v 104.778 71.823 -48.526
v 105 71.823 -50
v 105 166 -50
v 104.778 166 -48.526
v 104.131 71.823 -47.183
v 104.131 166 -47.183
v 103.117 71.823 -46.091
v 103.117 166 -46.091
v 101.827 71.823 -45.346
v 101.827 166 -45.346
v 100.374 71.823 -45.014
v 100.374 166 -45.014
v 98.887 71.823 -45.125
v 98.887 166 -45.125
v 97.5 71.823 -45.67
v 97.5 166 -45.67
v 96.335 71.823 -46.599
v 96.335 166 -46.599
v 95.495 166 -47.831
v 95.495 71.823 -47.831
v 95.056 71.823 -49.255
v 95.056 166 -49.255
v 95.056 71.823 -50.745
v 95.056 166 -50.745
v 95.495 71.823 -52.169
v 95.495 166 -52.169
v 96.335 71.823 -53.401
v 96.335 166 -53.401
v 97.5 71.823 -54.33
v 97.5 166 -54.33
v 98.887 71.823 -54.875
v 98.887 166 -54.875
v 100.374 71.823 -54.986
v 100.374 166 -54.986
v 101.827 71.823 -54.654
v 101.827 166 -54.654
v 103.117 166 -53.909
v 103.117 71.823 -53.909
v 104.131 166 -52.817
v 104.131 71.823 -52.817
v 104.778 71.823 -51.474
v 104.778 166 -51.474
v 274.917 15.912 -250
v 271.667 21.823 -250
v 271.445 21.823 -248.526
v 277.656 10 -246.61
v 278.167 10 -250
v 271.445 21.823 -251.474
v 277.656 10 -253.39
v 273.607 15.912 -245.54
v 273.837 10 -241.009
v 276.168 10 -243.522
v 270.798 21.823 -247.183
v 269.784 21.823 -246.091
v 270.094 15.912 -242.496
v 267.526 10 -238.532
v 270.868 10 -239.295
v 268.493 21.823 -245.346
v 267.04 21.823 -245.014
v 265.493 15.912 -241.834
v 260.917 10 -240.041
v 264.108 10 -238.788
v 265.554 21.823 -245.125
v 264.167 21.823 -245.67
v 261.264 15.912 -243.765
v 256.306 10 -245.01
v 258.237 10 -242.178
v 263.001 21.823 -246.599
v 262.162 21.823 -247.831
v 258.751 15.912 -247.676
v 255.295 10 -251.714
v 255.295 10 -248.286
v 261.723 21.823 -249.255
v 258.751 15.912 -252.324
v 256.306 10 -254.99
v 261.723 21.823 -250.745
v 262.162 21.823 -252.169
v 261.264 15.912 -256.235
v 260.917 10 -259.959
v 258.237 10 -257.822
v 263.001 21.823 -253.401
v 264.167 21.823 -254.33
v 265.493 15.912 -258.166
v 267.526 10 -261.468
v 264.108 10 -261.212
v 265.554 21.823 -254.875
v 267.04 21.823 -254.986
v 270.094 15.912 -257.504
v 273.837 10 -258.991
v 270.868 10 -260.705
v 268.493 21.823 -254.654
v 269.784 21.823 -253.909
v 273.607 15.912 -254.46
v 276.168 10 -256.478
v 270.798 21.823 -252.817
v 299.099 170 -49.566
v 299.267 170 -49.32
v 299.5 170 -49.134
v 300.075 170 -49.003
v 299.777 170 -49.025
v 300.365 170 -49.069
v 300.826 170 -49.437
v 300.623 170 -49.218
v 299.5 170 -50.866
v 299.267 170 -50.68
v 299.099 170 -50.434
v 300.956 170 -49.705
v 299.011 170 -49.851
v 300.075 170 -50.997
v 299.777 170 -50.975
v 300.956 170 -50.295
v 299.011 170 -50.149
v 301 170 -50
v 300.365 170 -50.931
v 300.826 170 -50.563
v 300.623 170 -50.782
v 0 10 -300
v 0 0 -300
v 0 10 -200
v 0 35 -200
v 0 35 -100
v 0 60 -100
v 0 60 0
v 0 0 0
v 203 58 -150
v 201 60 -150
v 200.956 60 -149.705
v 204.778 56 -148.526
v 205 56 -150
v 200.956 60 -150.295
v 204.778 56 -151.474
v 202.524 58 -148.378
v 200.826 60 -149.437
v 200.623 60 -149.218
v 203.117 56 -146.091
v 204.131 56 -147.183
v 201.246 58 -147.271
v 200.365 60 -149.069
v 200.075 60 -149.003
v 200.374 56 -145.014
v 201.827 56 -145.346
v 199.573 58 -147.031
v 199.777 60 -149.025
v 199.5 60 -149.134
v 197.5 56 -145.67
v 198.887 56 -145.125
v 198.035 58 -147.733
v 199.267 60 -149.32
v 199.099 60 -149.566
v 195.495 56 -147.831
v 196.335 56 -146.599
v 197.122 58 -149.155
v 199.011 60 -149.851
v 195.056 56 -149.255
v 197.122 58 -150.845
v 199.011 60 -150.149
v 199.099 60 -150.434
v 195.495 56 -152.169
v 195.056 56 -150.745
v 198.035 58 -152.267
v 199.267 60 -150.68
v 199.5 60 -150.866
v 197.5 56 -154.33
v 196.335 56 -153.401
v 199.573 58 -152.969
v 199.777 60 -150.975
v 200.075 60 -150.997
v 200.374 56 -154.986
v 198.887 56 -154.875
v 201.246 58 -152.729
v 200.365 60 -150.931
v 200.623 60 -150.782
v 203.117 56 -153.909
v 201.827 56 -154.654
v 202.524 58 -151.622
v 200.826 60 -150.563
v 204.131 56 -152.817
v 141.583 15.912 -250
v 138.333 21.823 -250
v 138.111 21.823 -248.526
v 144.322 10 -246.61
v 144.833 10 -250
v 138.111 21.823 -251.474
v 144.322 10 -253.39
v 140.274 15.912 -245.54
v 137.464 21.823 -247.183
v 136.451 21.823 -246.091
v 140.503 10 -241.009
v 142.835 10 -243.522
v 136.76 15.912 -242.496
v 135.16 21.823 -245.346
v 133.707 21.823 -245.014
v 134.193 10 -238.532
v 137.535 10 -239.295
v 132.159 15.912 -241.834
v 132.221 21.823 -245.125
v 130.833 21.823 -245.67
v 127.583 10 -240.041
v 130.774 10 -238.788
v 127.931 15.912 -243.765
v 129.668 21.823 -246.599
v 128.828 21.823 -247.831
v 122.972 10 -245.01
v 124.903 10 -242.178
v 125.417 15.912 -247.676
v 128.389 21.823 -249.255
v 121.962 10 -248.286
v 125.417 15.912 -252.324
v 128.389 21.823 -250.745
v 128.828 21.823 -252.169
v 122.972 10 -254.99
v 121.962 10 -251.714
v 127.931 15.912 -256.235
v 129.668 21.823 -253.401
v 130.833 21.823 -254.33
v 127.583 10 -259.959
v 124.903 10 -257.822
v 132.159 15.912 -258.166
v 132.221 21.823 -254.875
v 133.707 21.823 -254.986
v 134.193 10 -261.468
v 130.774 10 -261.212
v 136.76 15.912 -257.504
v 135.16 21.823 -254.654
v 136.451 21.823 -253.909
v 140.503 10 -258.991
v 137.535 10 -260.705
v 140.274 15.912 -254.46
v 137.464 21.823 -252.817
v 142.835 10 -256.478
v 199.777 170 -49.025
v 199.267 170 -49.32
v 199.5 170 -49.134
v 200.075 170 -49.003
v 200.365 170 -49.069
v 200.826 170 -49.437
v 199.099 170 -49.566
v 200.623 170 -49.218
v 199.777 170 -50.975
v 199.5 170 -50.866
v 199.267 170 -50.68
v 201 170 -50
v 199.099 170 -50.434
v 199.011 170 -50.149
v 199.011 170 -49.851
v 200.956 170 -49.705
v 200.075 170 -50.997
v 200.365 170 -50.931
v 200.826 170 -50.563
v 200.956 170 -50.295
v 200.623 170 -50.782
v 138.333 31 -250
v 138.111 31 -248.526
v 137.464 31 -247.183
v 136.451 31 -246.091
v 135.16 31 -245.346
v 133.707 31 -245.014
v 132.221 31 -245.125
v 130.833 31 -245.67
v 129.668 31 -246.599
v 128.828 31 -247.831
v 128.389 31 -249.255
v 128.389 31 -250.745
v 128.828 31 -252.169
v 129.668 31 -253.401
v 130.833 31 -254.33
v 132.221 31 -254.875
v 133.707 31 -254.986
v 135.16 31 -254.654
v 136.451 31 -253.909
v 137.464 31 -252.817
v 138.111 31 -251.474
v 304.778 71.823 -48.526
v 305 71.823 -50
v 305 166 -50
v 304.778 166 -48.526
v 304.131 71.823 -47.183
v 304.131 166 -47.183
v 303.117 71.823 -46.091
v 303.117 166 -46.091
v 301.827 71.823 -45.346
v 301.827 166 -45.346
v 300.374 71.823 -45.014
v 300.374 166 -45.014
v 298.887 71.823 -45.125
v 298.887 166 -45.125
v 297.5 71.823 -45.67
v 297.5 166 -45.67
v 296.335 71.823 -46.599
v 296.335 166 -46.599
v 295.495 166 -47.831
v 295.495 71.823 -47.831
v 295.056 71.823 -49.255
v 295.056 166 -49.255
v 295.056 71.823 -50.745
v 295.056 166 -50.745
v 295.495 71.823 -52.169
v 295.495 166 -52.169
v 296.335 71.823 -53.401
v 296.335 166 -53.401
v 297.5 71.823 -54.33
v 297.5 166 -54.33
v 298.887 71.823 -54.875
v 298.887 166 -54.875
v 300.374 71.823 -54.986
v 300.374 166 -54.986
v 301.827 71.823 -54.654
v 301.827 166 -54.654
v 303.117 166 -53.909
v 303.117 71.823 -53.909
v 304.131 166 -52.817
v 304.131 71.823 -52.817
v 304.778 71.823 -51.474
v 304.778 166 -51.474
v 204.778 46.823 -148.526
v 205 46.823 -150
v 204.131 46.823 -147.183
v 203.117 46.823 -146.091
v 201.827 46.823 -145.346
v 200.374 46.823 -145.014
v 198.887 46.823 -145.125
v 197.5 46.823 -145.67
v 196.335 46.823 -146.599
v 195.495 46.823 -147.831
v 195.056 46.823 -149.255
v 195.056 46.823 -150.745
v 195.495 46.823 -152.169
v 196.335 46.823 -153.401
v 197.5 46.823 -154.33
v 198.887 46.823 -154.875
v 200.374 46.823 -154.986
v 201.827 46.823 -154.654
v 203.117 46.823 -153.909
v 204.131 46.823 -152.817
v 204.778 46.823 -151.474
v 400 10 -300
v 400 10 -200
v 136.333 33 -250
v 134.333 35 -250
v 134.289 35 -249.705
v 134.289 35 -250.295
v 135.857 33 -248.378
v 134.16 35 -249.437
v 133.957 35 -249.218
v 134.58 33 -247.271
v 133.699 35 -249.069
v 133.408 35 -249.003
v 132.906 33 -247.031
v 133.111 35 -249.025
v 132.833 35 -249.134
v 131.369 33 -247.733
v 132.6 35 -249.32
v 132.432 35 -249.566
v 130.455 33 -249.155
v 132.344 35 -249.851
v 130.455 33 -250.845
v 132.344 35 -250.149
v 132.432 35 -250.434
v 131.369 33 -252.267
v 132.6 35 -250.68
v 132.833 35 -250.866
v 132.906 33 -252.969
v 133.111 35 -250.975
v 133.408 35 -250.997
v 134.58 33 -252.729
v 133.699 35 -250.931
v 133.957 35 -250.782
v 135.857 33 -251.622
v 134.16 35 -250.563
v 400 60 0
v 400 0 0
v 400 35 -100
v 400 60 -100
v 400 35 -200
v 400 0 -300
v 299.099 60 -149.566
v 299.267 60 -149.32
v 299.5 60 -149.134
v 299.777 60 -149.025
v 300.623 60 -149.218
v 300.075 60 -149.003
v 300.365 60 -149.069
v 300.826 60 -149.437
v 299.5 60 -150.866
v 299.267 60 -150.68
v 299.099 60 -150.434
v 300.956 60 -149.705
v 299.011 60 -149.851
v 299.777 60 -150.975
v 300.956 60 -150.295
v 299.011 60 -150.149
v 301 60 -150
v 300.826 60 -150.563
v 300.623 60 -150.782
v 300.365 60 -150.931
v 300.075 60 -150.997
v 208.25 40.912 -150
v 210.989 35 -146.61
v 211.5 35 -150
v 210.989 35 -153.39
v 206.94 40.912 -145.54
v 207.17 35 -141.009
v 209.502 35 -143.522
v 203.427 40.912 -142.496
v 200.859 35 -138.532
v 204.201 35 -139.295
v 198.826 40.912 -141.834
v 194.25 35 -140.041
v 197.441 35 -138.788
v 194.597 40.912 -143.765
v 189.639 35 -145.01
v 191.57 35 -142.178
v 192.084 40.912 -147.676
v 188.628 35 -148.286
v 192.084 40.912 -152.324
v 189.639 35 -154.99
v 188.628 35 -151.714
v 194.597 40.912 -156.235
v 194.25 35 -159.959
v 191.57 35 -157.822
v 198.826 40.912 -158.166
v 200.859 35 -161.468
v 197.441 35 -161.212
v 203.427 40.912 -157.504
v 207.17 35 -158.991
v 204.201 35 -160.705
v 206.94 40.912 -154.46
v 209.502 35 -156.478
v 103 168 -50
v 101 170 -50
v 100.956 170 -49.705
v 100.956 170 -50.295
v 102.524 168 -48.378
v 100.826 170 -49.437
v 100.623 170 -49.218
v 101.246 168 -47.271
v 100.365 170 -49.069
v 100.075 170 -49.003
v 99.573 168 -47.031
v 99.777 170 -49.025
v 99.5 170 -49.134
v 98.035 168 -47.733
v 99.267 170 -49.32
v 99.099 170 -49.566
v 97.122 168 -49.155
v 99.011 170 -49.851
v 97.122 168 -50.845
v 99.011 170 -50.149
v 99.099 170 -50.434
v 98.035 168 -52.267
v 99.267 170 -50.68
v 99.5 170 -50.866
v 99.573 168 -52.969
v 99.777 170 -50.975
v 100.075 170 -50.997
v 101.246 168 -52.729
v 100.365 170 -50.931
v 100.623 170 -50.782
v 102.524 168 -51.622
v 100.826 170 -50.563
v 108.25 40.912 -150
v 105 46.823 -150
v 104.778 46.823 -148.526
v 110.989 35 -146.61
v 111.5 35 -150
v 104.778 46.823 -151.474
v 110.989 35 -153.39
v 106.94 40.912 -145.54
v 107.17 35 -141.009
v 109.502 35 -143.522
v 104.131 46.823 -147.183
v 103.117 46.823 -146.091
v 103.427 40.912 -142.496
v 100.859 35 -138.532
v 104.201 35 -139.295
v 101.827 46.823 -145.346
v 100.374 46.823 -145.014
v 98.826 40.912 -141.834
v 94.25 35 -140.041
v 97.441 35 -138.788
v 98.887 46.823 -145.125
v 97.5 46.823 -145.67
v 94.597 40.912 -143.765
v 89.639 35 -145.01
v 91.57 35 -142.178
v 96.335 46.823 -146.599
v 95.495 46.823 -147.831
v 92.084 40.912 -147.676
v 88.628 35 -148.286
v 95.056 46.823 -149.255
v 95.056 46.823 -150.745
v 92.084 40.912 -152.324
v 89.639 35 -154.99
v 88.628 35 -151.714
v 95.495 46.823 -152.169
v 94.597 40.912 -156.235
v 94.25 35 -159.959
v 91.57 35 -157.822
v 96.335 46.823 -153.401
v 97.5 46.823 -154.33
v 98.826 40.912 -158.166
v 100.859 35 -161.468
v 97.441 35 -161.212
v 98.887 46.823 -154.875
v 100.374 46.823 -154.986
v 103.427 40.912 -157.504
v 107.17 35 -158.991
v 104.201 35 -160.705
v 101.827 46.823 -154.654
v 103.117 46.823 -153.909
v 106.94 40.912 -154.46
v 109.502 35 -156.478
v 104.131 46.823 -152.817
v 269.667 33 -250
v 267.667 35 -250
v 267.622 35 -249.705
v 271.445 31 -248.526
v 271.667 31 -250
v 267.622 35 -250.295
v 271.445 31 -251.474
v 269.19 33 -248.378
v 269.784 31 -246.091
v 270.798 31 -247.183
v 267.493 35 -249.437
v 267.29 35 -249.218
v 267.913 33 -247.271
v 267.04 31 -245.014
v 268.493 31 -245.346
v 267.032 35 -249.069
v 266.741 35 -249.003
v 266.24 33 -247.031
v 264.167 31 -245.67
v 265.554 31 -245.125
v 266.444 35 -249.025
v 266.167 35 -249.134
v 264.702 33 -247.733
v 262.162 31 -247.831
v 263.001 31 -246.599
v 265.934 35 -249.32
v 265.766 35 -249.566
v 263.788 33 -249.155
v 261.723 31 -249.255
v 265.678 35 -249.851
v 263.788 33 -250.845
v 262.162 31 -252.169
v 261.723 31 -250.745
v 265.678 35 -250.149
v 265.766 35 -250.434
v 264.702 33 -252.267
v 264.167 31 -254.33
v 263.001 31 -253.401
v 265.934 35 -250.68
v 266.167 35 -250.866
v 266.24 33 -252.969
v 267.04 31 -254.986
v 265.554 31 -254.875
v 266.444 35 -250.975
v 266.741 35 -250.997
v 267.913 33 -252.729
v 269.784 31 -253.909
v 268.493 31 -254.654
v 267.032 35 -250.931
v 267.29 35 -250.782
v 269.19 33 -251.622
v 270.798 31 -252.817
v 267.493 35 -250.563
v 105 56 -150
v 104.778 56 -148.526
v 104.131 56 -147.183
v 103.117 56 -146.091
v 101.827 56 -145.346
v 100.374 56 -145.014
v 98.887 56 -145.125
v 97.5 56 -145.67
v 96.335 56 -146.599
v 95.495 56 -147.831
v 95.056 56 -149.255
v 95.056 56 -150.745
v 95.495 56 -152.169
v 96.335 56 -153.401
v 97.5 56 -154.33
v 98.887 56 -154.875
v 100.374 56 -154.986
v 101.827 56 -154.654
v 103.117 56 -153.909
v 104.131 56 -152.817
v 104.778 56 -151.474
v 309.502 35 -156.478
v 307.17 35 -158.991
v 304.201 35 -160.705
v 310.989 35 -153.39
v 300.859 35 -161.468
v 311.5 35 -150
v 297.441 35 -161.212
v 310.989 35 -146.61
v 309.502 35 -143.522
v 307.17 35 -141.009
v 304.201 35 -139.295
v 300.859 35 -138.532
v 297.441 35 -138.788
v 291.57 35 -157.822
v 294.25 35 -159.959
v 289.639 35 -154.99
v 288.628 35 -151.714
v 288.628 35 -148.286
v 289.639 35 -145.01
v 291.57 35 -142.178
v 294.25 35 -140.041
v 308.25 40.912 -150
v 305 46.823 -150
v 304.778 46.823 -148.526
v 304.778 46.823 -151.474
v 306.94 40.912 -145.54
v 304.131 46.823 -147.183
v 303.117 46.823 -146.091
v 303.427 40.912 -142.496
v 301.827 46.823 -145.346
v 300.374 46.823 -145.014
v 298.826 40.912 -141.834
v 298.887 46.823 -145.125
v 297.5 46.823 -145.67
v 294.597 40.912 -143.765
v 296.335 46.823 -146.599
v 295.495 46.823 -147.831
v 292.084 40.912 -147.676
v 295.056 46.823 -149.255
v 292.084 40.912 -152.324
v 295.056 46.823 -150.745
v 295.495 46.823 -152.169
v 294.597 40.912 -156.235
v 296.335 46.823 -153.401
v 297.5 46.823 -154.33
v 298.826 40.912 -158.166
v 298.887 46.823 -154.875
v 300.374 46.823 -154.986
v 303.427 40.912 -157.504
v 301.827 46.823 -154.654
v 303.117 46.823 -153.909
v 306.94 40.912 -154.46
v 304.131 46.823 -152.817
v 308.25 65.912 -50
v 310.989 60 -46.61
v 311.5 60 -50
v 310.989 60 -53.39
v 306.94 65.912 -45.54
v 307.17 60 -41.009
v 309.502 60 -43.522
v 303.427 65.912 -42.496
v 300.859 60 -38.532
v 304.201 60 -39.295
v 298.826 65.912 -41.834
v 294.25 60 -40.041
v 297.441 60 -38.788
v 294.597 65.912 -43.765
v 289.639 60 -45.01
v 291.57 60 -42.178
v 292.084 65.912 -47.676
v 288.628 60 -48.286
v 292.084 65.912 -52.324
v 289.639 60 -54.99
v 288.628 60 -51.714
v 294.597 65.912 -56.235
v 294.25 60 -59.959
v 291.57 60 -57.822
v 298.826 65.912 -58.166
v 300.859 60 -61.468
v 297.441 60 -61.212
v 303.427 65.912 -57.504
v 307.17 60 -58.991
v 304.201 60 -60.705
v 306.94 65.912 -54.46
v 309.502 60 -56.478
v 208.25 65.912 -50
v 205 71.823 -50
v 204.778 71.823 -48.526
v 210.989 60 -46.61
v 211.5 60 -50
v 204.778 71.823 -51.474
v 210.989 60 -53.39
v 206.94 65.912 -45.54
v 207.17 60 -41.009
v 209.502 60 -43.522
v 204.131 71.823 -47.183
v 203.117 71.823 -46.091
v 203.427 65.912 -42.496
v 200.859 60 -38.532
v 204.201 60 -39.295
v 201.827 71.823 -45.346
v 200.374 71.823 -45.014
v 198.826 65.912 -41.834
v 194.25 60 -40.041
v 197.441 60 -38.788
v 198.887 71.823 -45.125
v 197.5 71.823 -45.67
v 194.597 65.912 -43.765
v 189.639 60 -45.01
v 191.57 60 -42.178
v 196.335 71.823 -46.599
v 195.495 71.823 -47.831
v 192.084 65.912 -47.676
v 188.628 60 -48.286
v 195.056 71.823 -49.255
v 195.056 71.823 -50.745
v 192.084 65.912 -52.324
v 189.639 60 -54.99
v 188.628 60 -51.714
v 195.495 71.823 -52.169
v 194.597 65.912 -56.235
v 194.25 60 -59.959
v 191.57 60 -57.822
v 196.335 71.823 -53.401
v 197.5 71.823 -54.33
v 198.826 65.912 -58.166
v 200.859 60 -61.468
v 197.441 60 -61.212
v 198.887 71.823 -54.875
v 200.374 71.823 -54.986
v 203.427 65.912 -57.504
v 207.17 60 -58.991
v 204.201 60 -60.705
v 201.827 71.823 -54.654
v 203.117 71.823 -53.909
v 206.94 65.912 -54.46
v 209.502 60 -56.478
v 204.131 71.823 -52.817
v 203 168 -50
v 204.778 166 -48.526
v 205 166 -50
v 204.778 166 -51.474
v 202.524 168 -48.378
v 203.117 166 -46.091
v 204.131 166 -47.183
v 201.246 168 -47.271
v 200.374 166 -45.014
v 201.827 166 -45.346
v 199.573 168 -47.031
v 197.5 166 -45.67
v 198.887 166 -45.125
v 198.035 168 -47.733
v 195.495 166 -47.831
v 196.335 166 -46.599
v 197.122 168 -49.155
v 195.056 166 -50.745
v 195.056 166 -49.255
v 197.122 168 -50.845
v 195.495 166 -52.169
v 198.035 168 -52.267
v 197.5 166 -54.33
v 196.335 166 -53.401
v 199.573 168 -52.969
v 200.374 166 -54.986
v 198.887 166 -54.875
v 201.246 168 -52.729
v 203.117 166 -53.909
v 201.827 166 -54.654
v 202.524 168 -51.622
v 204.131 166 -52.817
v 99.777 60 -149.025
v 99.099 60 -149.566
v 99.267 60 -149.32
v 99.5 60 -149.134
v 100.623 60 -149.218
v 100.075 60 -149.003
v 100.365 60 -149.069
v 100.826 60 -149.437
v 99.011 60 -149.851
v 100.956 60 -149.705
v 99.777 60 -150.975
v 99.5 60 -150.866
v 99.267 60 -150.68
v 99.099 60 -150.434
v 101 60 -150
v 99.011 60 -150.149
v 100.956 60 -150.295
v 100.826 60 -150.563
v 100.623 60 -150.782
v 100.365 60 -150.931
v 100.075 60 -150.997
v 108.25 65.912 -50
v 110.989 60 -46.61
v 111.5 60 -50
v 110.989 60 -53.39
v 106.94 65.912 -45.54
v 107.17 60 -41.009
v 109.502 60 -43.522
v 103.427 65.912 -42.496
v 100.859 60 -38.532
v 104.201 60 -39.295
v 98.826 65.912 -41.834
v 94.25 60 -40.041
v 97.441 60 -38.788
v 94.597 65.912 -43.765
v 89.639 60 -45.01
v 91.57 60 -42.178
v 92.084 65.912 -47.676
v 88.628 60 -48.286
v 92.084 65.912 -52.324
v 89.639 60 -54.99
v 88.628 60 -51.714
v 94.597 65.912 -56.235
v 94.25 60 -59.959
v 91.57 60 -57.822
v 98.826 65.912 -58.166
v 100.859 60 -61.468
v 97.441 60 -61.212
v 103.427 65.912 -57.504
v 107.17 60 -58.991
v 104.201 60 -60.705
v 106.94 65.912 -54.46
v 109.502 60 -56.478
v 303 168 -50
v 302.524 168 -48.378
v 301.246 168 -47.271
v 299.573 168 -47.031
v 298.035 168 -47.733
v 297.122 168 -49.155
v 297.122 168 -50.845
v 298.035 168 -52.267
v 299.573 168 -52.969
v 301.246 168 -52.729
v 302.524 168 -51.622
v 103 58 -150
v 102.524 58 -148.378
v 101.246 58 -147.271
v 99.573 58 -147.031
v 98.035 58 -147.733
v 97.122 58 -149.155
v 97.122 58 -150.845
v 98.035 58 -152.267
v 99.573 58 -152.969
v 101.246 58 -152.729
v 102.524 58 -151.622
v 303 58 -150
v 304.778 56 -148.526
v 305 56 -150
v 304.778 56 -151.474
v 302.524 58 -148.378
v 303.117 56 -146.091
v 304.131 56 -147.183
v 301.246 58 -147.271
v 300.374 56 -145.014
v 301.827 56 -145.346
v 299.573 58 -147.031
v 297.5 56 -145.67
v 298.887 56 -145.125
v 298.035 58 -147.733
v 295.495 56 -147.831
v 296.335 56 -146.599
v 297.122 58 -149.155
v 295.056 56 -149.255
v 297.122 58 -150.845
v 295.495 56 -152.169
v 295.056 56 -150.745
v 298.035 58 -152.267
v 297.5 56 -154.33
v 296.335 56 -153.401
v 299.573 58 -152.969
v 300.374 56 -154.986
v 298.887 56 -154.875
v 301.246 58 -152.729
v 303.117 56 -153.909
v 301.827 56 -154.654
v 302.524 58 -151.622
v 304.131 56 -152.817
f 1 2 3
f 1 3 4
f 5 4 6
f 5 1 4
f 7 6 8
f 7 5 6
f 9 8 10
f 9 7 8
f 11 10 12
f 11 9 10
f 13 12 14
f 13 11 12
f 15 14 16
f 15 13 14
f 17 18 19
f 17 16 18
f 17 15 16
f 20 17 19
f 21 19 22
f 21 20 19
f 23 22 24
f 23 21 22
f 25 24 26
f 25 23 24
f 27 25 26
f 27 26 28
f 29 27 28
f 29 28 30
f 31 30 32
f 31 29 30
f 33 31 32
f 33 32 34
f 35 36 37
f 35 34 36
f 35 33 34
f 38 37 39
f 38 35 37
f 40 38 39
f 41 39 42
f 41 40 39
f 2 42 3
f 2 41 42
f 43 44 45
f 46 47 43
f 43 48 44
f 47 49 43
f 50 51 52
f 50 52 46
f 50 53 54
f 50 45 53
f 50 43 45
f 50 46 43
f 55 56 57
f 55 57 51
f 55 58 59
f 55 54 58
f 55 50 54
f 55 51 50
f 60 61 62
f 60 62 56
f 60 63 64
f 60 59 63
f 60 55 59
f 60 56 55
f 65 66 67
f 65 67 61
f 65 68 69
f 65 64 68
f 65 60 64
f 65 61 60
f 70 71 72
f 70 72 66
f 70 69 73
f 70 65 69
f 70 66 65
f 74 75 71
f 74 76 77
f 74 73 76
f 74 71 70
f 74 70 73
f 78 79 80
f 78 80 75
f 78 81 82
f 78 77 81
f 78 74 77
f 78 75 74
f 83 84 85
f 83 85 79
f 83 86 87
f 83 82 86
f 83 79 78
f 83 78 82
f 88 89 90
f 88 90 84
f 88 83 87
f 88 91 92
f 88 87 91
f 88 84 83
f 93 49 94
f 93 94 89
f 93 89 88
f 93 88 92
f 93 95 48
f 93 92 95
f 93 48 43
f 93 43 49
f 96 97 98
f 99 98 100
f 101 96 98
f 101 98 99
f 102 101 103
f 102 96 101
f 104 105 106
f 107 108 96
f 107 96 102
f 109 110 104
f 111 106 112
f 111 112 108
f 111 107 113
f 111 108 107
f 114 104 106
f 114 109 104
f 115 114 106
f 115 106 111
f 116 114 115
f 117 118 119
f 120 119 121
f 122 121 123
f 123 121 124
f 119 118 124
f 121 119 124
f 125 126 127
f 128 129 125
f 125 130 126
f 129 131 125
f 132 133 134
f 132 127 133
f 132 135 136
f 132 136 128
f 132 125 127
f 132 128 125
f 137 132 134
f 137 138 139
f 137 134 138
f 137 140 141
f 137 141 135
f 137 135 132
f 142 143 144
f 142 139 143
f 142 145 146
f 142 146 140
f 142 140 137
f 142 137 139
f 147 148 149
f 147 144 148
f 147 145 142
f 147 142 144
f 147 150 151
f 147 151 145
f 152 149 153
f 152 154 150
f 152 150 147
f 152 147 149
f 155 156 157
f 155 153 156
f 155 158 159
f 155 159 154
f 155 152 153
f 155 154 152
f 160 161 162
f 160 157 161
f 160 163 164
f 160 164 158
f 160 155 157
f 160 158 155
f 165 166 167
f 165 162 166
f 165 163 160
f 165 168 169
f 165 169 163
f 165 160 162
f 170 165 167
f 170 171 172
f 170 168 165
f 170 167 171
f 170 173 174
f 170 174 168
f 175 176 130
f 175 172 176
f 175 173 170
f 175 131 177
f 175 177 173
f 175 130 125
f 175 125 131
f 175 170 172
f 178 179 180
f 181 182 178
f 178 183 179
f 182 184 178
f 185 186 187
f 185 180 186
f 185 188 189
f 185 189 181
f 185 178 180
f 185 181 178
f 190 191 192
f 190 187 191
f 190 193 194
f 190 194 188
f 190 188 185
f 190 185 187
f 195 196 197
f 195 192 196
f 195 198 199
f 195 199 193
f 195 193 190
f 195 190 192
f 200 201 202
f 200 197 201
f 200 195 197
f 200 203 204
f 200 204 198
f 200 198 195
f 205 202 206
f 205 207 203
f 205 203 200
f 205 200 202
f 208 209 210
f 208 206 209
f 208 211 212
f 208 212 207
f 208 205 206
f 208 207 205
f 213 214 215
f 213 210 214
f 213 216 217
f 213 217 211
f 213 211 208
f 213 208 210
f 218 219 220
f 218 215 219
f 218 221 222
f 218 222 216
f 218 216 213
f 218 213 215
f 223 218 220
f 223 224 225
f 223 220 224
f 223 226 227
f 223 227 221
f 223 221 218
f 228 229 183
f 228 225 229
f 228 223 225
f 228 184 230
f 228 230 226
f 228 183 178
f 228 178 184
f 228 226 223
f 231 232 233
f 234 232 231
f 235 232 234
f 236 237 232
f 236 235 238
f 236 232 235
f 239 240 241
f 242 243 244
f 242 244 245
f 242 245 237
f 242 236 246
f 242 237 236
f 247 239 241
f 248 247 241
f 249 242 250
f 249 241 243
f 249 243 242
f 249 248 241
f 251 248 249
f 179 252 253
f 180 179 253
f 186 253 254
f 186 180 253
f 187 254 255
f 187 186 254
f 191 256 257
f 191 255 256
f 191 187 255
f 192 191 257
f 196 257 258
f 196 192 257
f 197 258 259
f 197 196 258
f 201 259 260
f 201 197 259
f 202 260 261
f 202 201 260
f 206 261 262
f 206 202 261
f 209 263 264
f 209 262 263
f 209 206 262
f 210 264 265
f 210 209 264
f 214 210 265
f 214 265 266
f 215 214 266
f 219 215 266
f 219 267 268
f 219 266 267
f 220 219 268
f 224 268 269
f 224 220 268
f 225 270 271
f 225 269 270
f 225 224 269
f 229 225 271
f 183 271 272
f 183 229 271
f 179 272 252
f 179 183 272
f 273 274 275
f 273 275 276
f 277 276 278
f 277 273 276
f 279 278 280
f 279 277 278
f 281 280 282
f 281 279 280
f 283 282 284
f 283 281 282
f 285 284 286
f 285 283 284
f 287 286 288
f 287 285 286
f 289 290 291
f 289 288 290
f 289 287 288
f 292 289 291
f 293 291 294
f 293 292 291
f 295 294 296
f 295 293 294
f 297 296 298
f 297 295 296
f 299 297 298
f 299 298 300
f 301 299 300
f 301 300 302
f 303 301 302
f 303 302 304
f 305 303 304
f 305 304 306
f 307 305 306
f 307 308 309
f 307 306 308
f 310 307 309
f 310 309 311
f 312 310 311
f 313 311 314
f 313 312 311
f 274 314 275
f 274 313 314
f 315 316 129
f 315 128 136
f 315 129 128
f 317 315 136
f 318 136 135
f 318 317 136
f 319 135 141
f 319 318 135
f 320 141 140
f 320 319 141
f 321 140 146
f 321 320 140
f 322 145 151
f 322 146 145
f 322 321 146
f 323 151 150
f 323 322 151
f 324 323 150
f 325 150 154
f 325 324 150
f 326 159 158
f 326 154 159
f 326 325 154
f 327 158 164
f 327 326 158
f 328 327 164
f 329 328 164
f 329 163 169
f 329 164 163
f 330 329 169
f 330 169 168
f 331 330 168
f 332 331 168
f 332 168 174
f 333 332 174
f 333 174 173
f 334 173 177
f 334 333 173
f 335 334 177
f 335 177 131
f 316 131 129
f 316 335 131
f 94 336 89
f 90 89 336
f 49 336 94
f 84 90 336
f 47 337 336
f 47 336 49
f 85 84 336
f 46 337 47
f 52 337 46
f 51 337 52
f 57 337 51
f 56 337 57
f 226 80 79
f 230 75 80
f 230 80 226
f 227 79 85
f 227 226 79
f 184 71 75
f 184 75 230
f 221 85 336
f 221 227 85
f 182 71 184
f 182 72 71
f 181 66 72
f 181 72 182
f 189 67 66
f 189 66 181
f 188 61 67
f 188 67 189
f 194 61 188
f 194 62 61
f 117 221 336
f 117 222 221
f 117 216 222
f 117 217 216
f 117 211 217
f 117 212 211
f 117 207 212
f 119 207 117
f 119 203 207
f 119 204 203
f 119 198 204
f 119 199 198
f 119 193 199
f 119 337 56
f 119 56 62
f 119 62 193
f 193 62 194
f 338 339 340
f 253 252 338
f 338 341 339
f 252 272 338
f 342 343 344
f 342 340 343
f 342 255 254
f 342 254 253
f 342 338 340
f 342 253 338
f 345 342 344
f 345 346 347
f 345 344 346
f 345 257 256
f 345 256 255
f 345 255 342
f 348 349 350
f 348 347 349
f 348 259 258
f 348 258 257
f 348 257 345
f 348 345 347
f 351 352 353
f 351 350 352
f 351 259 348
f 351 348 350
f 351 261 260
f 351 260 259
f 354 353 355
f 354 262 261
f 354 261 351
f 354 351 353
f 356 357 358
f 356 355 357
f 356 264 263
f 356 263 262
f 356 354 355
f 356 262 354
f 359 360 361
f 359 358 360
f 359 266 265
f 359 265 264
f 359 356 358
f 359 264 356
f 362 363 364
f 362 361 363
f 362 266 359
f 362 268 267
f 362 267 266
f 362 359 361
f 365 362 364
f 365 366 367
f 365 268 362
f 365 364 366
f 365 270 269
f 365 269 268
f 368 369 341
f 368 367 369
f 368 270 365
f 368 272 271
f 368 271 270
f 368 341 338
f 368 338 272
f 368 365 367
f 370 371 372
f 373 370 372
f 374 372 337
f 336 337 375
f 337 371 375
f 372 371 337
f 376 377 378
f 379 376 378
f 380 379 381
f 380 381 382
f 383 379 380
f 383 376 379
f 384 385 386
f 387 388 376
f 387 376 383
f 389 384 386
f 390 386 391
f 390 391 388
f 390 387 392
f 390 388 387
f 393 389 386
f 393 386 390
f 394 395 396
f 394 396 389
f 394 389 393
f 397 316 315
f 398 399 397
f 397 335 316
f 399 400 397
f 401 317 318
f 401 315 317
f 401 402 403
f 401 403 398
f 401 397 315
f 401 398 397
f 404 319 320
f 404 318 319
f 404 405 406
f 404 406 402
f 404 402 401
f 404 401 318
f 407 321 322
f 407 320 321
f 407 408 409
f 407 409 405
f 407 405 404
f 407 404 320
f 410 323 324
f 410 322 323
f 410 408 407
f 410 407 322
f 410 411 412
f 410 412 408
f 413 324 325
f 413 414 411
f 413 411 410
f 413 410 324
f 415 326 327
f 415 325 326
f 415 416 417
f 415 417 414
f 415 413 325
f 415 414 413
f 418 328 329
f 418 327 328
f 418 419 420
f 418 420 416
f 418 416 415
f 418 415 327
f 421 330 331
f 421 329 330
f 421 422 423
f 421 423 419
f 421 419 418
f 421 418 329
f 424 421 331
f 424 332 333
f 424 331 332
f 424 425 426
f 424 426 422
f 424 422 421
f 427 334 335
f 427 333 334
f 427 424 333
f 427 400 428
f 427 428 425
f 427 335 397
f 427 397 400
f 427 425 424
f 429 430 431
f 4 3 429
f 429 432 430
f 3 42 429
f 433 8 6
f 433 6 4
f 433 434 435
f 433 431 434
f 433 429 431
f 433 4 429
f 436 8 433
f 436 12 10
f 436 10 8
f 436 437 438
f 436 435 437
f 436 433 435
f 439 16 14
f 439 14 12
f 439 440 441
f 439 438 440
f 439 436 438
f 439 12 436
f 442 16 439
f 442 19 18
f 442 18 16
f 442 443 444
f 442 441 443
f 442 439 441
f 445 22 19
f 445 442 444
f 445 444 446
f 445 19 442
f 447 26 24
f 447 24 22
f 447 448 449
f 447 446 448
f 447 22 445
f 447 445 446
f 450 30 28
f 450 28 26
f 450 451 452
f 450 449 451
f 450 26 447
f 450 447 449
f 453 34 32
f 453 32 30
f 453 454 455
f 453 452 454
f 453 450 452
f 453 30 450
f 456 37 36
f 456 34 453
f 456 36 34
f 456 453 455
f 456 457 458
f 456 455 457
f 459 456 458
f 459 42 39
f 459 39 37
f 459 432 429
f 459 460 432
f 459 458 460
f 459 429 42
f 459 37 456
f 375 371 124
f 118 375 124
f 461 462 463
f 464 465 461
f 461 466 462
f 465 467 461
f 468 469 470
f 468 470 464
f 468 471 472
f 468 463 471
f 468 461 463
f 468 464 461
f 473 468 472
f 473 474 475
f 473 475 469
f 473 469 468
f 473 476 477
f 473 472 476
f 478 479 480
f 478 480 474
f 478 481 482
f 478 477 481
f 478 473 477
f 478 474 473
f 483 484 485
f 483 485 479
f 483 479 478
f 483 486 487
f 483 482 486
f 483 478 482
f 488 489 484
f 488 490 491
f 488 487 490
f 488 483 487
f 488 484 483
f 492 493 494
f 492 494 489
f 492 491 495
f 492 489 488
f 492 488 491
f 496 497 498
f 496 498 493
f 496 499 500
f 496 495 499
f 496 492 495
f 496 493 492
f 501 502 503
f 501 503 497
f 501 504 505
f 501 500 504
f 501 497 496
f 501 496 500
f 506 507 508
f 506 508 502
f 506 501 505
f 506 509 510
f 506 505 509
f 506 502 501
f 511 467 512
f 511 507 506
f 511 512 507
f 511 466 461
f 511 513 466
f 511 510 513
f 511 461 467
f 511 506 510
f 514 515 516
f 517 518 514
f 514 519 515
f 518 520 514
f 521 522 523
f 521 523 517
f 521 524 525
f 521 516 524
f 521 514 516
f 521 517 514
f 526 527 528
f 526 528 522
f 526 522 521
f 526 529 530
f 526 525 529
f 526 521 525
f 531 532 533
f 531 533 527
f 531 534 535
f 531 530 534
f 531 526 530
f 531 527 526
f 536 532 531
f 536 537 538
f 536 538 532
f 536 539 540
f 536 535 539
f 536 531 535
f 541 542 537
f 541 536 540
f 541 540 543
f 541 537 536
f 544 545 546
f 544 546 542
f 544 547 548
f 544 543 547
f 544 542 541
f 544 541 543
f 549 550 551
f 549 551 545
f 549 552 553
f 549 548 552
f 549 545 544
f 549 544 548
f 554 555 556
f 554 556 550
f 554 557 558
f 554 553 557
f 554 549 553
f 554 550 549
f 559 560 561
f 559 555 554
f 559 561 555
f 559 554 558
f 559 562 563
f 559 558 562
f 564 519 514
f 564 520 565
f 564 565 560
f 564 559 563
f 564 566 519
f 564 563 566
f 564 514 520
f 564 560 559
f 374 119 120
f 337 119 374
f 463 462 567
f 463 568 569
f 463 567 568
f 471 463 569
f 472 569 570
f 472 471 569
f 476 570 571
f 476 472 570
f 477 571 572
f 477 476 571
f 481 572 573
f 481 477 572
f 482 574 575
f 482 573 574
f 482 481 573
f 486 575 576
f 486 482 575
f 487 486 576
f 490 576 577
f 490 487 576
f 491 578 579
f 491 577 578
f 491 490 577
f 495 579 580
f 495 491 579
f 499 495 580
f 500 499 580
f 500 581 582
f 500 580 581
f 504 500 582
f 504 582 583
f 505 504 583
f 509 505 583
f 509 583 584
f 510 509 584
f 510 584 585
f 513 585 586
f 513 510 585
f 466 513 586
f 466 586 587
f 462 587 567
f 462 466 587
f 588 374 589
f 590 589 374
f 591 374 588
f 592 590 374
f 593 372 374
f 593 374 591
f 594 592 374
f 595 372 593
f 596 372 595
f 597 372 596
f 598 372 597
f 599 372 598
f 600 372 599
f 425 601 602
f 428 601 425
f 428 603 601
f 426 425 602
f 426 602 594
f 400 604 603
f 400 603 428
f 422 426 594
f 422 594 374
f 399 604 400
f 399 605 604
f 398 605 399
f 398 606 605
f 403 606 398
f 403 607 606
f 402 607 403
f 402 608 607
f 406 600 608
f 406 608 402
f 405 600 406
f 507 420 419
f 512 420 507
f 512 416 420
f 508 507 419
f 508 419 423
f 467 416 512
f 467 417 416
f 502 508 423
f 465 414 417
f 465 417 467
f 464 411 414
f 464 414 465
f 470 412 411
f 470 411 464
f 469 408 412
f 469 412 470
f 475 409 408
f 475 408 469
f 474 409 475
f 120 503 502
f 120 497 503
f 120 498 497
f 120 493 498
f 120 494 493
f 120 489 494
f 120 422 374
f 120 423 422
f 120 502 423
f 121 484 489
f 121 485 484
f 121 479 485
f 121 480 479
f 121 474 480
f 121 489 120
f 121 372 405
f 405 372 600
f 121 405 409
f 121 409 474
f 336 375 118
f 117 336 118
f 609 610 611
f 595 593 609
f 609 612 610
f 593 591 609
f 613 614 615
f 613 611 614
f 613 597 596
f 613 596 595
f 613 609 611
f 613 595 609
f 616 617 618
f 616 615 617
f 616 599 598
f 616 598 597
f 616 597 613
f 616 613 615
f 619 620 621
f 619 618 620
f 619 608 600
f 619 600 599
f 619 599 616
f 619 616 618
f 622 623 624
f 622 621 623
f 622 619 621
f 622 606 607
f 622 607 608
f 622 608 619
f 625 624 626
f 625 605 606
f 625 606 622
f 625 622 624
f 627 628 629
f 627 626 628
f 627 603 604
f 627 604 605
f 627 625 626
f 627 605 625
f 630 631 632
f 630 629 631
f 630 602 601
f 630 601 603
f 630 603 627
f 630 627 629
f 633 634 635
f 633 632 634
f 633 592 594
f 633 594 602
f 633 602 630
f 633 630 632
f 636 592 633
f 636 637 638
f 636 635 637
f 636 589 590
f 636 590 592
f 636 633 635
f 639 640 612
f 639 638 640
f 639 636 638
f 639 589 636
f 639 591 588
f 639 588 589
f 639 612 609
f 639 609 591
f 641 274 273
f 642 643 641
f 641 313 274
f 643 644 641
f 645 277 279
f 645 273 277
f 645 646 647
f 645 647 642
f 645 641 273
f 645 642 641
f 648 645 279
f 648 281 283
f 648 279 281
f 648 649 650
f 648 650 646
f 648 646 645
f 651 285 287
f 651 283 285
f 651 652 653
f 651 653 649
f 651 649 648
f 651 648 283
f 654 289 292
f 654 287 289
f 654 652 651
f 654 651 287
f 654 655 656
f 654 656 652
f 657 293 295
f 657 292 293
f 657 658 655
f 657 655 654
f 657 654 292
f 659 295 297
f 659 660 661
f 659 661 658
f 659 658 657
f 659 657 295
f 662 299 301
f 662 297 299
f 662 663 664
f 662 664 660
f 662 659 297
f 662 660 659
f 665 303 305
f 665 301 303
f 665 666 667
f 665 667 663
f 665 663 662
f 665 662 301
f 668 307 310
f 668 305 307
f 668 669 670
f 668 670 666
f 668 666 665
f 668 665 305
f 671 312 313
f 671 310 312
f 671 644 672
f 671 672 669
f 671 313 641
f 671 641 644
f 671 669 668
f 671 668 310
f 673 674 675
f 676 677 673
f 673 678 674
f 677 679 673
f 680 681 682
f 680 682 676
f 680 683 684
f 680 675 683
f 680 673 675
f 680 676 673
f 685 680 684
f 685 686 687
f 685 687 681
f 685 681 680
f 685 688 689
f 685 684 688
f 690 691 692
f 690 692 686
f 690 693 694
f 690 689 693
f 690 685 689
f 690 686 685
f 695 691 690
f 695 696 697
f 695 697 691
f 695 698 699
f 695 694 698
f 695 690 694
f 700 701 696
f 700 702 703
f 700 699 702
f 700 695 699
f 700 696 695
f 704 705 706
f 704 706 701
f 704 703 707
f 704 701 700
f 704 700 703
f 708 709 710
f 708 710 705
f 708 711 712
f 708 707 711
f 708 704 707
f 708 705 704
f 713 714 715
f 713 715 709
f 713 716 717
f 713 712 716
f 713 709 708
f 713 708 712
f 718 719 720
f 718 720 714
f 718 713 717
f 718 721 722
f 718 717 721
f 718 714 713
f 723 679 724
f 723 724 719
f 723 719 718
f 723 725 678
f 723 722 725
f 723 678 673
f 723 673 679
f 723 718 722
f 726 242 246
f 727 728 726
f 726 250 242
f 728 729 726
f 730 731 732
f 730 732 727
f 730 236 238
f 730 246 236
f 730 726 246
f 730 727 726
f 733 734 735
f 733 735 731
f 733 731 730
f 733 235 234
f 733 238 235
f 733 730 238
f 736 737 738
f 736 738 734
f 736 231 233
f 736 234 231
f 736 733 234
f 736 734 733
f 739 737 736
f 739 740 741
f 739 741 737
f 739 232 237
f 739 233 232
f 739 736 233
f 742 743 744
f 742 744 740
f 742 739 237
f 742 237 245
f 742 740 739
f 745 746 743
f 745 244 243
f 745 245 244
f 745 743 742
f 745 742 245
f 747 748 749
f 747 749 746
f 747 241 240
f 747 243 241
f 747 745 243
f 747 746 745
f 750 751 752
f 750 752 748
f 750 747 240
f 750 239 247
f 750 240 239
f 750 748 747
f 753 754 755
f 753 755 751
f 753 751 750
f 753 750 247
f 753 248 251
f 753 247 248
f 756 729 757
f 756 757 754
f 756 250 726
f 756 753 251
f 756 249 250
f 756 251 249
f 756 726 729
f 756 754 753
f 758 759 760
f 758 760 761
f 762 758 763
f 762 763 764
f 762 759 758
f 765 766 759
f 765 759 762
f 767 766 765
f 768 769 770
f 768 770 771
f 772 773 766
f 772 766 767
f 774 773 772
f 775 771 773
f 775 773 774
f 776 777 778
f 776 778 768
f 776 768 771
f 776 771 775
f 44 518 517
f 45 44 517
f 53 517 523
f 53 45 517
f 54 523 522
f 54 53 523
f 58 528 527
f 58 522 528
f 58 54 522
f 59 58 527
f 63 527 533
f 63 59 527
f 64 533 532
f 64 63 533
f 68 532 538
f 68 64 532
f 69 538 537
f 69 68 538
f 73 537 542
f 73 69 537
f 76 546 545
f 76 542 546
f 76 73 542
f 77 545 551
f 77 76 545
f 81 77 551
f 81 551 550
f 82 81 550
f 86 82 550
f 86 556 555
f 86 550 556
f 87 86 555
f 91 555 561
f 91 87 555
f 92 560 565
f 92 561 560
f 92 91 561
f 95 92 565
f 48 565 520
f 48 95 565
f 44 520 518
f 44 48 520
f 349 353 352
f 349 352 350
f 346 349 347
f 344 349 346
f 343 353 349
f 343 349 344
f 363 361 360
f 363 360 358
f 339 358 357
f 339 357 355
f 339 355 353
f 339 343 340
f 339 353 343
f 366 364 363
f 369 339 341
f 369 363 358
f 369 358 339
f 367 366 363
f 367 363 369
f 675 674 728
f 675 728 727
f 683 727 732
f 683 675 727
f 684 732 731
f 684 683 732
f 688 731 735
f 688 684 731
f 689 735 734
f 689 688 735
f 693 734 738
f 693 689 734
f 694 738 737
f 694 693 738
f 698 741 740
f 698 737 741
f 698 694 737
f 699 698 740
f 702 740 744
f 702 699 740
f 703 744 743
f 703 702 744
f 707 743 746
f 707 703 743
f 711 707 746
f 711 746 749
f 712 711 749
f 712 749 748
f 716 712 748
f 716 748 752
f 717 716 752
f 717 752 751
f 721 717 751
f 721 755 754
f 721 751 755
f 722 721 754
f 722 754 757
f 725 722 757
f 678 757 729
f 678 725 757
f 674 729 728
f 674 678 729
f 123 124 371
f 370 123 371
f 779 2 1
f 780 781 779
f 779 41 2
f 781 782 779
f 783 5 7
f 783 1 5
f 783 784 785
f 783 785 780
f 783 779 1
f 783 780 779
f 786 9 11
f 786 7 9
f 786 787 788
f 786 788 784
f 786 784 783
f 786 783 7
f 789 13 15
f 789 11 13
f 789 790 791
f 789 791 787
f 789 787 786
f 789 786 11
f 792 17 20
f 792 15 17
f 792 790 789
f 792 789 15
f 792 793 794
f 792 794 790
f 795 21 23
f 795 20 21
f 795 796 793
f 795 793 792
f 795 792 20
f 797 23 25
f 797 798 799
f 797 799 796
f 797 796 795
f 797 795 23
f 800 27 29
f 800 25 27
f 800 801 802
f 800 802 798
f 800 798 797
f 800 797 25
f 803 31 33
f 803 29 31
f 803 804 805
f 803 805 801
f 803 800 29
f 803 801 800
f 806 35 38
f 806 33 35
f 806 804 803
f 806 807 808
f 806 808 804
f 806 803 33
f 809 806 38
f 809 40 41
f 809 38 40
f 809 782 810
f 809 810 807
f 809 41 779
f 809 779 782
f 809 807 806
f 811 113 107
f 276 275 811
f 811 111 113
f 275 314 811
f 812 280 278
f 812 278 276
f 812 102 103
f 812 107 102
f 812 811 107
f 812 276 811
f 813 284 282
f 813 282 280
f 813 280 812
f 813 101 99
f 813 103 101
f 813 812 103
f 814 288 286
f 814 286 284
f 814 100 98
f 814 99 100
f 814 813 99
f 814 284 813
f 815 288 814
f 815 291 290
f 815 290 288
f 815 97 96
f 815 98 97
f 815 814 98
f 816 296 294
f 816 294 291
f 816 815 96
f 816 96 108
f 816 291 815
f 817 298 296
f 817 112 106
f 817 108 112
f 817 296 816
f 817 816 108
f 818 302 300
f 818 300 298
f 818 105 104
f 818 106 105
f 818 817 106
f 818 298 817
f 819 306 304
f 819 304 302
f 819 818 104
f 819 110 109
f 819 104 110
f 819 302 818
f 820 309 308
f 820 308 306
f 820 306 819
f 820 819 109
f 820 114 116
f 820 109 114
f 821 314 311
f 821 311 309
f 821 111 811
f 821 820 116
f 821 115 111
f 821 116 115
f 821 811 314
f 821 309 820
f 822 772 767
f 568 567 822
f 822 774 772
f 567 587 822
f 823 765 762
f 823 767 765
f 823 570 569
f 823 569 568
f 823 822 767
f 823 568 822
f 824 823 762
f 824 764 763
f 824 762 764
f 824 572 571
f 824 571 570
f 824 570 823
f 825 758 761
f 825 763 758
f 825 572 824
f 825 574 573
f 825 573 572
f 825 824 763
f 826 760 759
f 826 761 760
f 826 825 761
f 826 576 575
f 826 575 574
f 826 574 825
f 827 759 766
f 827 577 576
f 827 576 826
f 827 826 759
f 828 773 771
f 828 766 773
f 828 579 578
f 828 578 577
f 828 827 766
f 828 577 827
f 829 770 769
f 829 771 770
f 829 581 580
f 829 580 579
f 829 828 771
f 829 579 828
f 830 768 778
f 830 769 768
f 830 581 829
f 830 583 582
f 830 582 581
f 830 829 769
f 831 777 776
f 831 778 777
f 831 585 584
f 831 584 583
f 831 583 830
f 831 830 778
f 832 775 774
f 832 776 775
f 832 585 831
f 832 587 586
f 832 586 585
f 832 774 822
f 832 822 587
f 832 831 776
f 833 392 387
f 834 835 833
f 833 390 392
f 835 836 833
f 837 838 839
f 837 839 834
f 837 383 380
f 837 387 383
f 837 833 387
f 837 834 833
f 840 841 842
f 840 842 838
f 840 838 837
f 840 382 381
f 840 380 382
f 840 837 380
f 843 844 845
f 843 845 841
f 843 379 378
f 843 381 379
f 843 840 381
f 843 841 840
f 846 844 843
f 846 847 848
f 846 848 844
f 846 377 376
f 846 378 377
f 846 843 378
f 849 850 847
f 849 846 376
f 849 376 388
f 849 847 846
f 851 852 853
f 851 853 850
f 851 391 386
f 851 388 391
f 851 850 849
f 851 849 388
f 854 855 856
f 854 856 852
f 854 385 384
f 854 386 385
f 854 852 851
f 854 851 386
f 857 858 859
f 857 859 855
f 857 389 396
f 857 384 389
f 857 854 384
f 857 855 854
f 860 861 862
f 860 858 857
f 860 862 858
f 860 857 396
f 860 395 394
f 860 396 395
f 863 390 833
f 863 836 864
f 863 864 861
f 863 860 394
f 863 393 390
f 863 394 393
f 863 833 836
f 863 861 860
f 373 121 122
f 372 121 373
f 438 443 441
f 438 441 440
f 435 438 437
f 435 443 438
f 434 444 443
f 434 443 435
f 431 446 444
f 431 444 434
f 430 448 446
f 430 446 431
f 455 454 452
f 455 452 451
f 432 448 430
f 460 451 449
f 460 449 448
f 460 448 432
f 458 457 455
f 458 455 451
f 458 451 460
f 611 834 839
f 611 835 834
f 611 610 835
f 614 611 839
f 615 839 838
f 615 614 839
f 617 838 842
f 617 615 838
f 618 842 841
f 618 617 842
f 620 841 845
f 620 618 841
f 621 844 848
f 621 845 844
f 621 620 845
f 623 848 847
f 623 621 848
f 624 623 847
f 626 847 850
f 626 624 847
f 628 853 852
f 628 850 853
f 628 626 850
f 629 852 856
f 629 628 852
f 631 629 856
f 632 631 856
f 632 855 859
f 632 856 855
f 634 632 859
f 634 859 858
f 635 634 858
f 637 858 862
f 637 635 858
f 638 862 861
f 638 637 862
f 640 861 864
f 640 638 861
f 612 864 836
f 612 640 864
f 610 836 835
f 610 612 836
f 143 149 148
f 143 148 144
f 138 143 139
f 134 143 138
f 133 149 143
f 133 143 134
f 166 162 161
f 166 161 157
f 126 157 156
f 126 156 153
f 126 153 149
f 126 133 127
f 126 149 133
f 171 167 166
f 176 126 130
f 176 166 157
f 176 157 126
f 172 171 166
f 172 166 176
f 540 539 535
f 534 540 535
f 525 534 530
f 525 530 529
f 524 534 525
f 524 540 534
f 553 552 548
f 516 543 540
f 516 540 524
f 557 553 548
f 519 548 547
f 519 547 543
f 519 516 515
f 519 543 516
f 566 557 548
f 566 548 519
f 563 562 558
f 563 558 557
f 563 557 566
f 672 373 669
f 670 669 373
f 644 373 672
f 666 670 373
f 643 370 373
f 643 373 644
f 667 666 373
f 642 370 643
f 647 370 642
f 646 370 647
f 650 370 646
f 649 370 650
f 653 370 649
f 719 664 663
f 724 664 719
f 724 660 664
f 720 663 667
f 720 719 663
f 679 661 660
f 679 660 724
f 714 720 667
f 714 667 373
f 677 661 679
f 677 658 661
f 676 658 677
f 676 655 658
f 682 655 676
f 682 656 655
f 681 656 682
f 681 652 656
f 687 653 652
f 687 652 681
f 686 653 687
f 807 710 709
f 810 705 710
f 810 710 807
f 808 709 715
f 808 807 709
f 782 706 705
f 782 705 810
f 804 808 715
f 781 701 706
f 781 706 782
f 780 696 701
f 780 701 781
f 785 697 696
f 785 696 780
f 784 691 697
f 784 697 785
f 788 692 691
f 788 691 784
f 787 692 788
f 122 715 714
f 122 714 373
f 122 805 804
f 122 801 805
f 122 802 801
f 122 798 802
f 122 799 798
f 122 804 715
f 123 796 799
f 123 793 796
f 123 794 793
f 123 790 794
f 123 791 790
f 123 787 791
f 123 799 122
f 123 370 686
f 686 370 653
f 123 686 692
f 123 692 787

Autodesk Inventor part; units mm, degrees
ref_plane "YZ Plane" through (0, 0, 0) normal (1, 0, 0) x (0, 1, 0)
ref_plane "XZ Plane" through (0, 0, 0) normal (0, 1, 0) x (-1, 0, 0)
ref_plane "XY Plane" through (0, 0, 0) normal (0, 0, 1) x (1, 0, 0)
sketch "Sketch1" plane through (0, 0, 0) normal (0, 1, 0) x (-1, 0, 0)
  line L0 (0, 0) -> (-400, 0)
  line L1 (-400, 0) -> (-400, -300)
  line L2 (-400, -300) -> (0, -300)
  line L3 (0, -300) -> (0, 0)
  line L4 (0, -200) -> (-400, -200)
  line L5 (0, -100) -> (-400, -100)
  dimension "d0" = 400
  dimension "d1" = 300
  dimension "d21" = 100
  dimension "d22" = 100
extrude "Extrusion1" add sketch "Sketch1" along normal blind 10 contours L3 L2 L1 L4
extrude "Extrusion2" add sketch "Sketch1" along normal blind 35 contours L3 L4 L1 L5
extrude "Extrusion3" add sketch "Sketch1" along normal blind 60 contours L3 L5 L1 L0
sketch "Sketch2" plane through (0, 60, 0) normal (0, 1, 0) x (1, 0, 0)
  line L0 (0, 300) -> (0, 0) projected
  line L1 (0, 50) -> (400, 50) construction
  line L2 (400, 0) -> (400, 300) projected
  line L3 (0, 0) -> (400, 0) projected
  line L4 (0, 100) -> (0, 0) projected
  circle A0 centre (100, 50) radius 5
  circle A1 centre (200, 50) radius 5
  circle A2 centre (300, 50) radius 5
  point P0 (0, 50)
  dimension "d30" = 50
  dimension "d32" = 100
  dimension "d33" = 100
  dimension "d34" = 100
  dimension "d35" = 10
  dimension "d36" = 10
  dimension "d37" = 10
extrude "Extrusion4" add sketch "Sketch2" along normal blind 110
chamfer "Chamfer1" distance 4 angle 45 3 edges at (295, 170, -50) (195, 170, -50) (95, 170, -50)
sketch "Sketch3" plane through (0, 35, 0) normal (0, 1, 0) x (1, 0, 0)
  line L0 (0, 200) -> (0, 100) projected
  line L1 (0, 150) -> (400, 150) construction
  line L2 (400, 0) -> (400, 300) projected
  circle A0 centre (100, 150) radius 5
  circle A1 centre (200, 150) radius 5
  circle A2 centre (300, 150) radius 5
  point P0 (0, 0)
  dimension "d43" = 100
  dimension "d44" = 100
  dimension "d45" = 100
  dimension "d46" = 10
  dimension "d47" = 10
  dimension "d48" = 10
extrude "Extrusion5" add sketch "Sketch3" along normal blind 25
sketch "Sketch4" plane through (0, 10, 0) normal (0, 1, 0) x (1, 0, 0)
  line L0 (0, 300) -> (0, 200) projected
  line L1 (0, 250) -> (400, 250) construction
  line L2 (400, 0) -> (400, 300) projected
  circle A0 centre (133.3333, 250) radius 5
  circle A1 centre (266.6667, 250) radius 5
  point P0 (0, 0)
  dimension "d51" = 133.3333
  dimension "d52" = 133.3333
  dimension "d53" = 10
  dimension "d54" = 10
extrude "Extrusion6" add sketch "Sketch4" along normal blind 25
chamfer "Chamfer2" distance 4 angle 45 5 edges at (295, 60, -150) (261.6667, 35, -250) (128.3333, 35, -250) (95, 60, -150) (195, 60, -150)
chamfer "Chamfer3" distance 6.5 angle 61.2 1 edges at (295, 60, -50) measured on face at (200.2009, 60, -84.9878)
chamfer "Chamfer4" distance 6.5 angle 61.2 2 edges at (195, 60, -50) (95, 60, -50) measured on face at (200.2009, 60, -84.9878)
chamfer "Chamfer5" distance 6.5 angle 61.2 3 edges at (295, 35, -150) (195, 35, -150) (95, 35, -150) measured on face at (200.2009, 35, -184.9878)
chamfer "Chamfer6" distance 6.5 angle 61.2 2 edges at (128.3333, 10, -250) (261.6667, 10, -250) measured on face at (222.0213, 10, -215.0122)
